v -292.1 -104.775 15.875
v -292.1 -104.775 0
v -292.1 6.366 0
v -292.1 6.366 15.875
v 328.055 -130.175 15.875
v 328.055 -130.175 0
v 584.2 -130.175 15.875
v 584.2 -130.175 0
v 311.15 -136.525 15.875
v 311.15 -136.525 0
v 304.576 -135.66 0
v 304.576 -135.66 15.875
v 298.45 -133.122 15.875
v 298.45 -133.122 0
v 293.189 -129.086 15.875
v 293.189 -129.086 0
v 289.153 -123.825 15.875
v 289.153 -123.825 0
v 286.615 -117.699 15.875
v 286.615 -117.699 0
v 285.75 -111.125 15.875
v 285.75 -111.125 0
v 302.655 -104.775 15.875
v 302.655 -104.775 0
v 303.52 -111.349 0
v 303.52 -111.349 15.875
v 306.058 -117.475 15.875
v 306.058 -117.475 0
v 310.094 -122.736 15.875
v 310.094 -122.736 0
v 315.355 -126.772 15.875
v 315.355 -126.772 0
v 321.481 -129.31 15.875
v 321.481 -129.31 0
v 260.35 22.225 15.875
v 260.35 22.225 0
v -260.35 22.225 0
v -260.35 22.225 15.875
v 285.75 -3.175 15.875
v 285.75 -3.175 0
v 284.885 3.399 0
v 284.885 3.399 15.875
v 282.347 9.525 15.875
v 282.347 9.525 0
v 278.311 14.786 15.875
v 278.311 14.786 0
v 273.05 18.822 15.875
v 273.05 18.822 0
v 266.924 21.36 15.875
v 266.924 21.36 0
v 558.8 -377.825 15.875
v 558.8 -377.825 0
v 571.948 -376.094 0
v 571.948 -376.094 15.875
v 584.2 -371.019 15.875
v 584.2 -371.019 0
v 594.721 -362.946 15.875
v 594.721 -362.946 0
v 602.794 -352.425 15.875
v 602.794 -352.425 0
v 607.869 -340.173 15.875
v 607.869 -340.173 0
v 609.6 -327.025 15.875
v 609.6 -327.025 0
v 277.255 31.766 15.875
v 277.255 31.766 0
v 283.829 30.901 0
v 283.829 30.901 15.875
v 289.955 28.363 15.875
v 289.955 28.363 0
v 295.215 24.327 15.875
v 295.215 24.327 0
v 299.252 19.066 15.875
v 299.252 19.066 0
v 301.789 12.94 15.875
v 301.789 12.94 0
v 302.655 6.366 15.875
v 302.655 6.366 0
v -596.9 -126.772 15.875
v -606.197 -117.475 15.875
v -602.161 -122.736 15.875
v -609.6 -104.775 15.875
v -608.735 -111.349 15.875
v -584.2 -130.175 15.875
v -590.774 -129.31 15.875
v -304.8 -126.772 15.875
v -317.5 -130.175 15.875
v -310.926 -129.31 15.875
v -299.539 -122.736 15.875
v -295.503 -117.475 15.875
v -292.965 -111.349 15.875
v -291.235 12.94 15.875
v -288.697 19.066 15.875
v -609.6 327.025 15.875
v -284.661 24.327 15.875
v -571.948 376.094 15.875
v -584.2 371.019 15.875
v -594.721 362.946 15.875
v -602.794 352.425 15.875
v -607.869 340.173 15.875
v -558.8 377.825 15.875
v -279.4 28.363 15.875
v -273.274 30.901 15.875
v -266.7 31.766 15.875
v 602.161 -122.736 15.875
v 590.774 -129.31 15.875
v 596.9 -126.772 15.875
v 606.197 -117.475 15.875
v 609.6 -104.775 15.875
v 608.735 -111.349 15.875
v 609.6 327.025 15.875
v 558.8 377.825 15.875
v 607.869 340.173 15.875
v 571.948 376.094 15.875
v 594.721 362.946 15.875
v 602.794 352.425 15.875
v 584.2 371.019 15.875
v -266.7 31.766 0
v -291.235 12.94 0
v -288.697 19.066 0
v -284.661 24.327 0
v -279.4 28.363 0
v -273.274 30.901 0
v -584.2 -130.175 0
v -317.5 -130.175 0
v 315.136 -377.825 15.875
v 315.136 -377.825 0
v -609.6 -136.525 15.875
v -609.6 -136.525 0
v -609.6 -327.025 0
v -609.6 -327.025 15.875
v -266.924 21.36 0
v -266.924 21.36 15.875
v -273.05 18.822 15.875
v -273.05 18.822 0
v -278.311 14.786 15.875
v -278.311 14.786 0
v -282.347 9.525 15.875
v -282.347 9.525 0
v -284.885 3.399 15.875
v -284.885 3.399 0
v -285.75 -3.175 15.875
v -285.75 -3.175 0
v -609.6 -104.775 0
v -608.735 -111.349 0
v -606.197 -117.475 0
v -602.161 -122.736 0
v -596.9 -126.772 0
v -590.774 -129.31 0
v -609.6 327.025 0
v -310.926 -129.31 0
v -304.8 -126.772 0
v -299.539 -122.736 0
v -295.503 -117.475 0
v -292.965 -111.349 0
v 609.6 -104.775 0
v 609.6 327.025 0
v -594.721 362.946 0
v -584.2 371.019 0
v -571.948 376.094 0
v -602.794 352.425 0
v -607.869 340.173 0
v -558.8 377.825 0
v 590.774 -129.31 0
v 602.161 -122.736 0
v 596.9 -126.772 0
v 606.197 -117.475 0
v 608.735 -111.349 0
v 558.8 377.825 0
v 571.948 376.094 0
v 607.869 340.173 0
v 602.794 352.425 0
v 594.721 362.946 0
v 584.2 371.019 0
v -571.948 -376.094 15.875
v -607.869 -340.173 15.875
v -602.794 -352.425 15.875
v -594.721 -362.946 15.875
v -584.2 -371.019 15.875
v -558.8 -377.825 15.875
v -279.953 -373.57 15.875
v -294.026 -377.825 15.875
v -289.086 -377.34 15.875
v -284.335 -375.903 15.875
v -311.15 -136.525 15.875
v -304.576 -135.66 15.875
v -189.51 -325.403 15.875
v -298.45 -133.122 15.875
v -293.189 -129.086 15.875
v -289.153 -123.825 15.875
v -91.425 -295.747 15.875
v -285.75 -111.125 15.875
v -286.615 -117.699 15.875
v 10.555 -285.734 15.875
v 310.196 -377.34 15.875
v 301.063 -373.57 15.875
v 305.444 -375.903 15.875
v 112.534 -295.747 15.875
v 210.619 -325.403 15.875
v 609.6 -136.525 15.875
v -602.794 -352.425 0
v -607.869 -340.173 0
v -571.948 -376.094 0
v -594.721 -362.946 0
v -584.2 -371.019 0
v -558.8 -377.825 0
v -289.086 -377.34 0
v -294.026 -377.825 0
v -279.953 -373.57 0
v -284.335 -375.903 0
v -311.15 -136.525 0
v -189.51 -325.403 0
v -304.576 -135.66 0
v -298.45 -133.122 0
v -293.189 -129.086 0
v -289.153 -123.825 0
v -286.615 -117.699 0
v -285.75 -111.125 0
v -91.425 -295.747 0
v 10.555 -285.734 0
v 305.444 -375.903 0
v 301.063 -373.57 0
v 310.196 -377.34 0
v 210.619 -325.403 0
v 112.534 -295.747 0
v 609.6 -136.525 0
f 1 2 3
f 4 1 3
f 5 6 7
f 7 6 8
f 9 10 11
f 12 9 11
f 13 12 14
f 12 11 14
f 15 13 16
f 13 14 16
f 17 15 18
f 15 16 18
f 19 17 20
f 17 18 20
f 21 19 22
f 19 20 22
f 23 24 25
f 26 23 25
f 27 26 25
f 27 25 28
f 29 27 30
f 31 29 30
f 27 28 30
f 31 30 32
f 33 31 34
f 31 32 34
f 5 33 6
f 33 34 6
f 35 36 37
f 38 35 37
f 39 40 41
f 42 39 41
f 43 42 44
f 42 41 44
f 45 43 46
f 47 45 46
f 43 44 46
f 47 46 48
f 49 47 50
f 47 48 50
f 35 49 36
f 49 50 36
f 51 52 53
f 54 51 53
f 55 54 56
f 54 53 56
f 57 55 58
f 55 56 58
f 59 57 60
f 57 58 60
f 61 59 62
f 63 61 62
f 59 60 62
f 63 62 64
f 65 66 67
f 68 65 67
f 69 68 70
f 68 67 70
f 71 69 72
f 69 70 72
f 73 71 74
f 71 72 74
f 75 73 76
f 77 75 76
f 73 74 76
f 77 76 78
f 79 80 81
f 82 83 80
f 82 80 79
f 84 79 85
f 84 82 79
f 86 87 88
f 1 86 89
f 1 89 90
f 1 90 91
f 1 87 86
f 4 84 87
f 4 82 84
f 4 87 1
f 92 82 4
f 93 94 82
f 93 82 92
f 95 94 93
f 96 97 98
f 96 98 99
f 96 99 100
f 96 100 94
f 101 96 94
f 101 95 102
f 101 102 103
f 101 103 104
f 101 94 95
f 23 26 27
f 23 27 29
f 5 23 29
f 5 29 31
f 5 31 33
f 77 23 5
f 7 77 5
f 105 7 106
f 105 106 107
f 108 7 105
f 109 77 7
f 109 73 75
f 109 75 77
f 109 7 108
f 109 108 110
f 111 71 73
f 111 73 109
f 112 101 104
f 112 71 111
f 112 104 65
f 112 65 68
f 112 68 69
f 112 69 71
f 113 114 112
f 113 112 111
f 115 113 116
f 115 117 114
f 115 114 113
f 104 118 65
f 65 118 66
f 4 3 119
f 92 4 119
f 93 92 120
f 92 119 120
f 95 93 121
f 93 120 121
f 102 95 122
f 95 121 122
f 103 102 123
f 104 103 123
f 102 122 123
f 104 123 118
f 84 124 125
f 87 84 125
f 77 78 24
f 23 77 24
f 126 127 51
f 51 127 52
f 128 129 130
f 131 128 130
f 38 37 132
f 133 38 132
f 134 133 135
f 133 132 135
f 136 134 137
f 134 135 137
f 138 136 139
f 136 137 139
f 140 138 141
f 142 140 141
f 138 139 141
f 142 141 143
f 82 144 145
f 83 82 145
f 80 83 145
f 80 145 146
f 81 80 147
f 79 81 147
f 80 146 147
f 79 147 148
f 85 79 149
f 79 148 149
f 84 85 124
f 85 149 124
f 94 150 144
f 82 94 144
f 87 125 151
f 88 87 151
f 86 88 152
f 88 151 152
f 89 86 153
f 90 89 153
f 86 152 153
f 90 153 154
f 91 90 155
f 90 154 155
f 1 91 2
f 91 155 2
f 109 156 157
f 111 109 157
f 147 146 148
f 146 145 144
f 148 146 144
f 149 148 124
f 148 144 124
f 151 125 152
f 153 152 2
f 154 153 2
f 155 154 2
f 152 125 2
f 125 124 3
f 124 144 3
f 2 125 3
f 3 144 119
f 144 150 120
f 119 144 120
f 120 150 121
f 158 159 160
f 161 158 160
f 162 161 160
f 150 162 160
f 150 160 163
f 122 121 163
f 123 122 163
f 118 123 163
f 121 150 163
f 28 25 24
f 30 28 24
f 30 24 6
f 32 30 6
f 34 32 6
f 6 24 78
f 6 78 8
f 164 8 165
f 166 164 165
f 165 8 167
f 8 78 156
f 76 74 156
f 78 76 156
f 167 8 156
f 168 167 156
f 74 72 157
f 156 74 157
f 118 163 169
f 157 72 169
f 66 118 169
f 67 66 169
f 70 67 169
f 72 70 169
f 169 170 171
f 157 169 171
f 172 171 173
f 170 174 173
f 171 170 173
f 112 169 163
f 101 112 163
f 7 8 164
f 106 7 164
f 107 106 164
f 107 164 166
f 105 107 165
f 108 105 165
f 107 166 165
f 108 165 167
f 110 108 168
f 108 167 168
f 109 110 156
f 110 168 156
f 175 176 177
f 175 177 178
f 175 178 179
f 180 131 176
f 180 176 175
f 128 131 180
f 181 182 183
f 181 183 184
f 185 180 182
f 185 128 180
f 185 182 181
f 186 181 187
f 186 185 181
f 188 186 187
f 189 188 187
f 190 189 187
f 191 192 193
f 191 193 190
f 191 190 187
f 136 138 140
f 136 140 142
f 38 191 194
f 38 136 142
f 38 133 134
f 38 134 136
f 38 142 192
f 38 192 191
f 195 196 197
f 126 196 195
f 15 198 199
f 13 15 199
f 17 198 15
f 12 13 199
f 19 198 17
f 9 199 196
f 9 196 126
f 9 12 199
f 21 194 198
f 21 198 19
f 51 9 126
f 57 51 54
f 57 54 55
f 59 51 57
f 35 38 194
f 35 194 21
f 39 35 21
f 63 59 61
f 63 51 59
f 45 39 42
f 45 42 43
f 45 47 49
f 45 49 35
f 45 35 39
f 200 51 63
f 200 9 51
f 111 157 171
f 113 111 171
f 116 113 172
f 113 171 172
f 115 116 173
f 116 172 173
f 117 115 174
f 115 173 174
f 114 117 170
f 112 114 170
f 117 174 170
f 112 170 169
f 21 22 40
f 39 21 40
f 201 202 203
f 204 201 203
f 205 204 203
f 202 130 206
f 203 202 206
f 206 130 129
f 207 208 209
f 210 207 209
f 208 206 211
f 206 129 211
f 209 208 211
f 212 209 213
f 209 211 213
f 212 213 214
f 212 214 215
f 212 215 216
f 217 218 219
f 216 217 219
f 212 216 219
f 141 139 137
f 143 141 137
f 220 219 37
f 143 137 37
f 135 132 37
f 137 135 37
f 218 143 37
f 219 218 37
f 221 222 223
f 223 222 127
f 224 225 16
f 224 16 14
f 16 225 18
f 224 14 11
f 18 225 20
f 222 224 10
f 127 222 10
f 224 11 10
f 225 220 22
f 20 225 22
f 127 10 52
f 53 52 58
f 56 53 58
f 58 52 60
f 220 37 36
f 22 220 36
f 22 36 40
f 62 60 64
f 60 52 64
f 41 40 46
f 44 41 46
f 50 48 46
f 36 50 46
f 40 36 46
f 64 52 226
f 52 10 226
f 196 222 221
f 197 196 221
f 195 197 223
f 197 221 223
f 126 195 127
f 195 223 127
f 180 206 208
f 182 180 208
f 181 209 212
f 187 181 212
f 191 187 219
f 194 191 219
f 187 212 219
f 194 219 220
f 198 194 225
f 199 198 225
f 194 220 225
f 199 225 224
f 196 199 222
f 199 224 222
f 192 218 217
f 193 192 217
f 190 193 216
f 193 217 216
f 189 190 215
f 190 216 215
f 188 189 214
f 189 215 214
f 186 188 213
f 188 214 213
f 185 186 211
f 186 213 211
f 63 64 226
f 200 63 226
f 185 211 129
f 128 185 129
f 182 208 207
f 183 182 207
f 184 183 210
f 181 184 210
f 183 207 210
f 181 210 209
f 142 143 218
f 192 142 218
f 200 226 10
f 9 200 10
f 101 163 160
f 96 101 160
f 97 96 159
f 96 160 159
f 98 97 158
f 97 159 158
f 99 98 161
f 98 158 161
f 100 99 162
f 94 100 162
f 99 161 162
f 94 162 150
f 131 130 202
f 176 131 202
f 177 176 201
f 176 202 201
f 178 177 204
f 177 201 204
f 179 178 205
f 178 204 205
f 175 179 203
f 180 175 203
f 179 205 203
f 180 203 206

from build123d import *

# Parameters (mm, degrees)
F1_DEPTH = 15.875
F2_DEPTH = 15.875


# Not quite as in the source:
# - a length typed as a fraction of an inch, garbled in the dataset ("3 / 203.2 mm" for 3/8 in), is restored


with BuildPart() as f1:
    # F0 (on Top) → F1 (new body)
    with BuildSketch(Plane.XY):
        with BuildLine():
            Line((-558.8, -377.825), (-294.0262573309, -377.825))
            ThreePointArc((-294.0262573309, -377.825), (-286.6751320609, -376.7379791935), (-279.9532056979, -373.569957265))
            ThreePointArc((-279.9532056979, -373.569957265), (10.5547887247, -285.7337179487), (301.0627831473, -373.569957265))
            ThreePointArc((301.0627831473, -373.569957265), (307.7847095103, -376.7379791935), (315.1358347803, -377.825))
            Line((315.1358347803, -377.825), (558.8, -377.825))
            ThreePointArc((558.8, -377.825), (594.7210244843, -362.9460244843), (609.6, -327.025))
            Line((609.6, -327.025), (609.6, -136.5972012281))
            Line((609.6, -136.5972012281), (609.6, -136.525))
            Line((609.6, -136.525), (311.1499893665, -136.525))
            ThreePointArc((311.1499893665, -136.525), (293.1894771244, -129.0855122421), (285.7499893665, -111.125))
            Line((285.7499893665, -111.125), (285.7499893665, -3.1749994576))
            ThreePointArc((285.7499893665, -3.1749994576), (278.3105016087, 14.7855127845), (260.3499893665, 22.2250005424))
            Line((260.3499893665, 22.2250005424), (-260.35, 22.2250005424))
            ThreePointArc((-260.35, 22.2250005424), (-278.3105122421, 14.7855127845), (-285.75, -3.1749994576))
            Line((-285.75, -3.1749994576), (-285.75, -111.125))
            ThreePointArc((-285.75, -111.125), (-293.1894877579, -129.0855122421), (-311.15, -136.525))
            Line((-311.15, -136.525), (-609.6, -136.525))
            Line((-609.6, -136.525), (-609.6, -327.025))
            ThreePointArc((-609.6, -327.025), (-594.7210244843, -362.9460244843), (-558.8, -377.825))
        make_face()
    extrude(amount=F1_DEPTH)


with BuildPart() as f2:
    # F0 (on Top) → F2 (new body)
    with BuildSketch(Plane.XY):
        with BuildLine():
            ThreePointArc((609.6, 327.025), (594.7210244843, 362.9460244843), (558.8, 377.825))
            Line((558.8, 377.825), (-558.8, 377.825))
            ThreePointArc((-558.8, 377.825), (-594.7210244843, 362.9460244843), (-609.6, 327.025))
            Line((-609.6, 327.025), (-609.6, -104.775))
            ThreePointArc((-609.6, -104.775), (-602.1605122421, -122.7355122421), (-584.2, -130.175))
            Line((-584.2, -130.175), (-317.5, -130.175))
            ThreePointArc((-317.5, -130.175), (-299.5394877579, -122.7355122421), (-292.1, -104.775))
            Line((-292.1, -104.775), (-292.1, 6.3662820513))
            ThreePointArc((-292.1, 6.3662820513), (-284.6605122421, 24.3267942934), (-266.7, 31.7662820513))
            Line((-266.7, 31.7662820513), (277.2547887247, 31.7662820513))
            ThreePointArc((277.2547887247, 31.7662820513), (295.2153009668, 24.3267942934), (302.6547887247, 6.3662820513))
            Line((302.6547887247, 6.3662820513), (302.6547887247, -104.775))
            ThreePointArc((302.6547887247, -104.775), (310.0942764826, -122.7355122421), (328.0547887247, -130.175))
            Line((328.0547887247, -130.175), (584.2, -130.175))
            ThreePointArc((584.2, -130.175), (602.1605122421, -122.7355122421), (609.6, -104.775))
            Line((609.6, -104.775), (609.6, 327.025))
        make_face()
    extrude(amount=F2_DEPTH)


solid = Compound([f1.part, f2.part])
